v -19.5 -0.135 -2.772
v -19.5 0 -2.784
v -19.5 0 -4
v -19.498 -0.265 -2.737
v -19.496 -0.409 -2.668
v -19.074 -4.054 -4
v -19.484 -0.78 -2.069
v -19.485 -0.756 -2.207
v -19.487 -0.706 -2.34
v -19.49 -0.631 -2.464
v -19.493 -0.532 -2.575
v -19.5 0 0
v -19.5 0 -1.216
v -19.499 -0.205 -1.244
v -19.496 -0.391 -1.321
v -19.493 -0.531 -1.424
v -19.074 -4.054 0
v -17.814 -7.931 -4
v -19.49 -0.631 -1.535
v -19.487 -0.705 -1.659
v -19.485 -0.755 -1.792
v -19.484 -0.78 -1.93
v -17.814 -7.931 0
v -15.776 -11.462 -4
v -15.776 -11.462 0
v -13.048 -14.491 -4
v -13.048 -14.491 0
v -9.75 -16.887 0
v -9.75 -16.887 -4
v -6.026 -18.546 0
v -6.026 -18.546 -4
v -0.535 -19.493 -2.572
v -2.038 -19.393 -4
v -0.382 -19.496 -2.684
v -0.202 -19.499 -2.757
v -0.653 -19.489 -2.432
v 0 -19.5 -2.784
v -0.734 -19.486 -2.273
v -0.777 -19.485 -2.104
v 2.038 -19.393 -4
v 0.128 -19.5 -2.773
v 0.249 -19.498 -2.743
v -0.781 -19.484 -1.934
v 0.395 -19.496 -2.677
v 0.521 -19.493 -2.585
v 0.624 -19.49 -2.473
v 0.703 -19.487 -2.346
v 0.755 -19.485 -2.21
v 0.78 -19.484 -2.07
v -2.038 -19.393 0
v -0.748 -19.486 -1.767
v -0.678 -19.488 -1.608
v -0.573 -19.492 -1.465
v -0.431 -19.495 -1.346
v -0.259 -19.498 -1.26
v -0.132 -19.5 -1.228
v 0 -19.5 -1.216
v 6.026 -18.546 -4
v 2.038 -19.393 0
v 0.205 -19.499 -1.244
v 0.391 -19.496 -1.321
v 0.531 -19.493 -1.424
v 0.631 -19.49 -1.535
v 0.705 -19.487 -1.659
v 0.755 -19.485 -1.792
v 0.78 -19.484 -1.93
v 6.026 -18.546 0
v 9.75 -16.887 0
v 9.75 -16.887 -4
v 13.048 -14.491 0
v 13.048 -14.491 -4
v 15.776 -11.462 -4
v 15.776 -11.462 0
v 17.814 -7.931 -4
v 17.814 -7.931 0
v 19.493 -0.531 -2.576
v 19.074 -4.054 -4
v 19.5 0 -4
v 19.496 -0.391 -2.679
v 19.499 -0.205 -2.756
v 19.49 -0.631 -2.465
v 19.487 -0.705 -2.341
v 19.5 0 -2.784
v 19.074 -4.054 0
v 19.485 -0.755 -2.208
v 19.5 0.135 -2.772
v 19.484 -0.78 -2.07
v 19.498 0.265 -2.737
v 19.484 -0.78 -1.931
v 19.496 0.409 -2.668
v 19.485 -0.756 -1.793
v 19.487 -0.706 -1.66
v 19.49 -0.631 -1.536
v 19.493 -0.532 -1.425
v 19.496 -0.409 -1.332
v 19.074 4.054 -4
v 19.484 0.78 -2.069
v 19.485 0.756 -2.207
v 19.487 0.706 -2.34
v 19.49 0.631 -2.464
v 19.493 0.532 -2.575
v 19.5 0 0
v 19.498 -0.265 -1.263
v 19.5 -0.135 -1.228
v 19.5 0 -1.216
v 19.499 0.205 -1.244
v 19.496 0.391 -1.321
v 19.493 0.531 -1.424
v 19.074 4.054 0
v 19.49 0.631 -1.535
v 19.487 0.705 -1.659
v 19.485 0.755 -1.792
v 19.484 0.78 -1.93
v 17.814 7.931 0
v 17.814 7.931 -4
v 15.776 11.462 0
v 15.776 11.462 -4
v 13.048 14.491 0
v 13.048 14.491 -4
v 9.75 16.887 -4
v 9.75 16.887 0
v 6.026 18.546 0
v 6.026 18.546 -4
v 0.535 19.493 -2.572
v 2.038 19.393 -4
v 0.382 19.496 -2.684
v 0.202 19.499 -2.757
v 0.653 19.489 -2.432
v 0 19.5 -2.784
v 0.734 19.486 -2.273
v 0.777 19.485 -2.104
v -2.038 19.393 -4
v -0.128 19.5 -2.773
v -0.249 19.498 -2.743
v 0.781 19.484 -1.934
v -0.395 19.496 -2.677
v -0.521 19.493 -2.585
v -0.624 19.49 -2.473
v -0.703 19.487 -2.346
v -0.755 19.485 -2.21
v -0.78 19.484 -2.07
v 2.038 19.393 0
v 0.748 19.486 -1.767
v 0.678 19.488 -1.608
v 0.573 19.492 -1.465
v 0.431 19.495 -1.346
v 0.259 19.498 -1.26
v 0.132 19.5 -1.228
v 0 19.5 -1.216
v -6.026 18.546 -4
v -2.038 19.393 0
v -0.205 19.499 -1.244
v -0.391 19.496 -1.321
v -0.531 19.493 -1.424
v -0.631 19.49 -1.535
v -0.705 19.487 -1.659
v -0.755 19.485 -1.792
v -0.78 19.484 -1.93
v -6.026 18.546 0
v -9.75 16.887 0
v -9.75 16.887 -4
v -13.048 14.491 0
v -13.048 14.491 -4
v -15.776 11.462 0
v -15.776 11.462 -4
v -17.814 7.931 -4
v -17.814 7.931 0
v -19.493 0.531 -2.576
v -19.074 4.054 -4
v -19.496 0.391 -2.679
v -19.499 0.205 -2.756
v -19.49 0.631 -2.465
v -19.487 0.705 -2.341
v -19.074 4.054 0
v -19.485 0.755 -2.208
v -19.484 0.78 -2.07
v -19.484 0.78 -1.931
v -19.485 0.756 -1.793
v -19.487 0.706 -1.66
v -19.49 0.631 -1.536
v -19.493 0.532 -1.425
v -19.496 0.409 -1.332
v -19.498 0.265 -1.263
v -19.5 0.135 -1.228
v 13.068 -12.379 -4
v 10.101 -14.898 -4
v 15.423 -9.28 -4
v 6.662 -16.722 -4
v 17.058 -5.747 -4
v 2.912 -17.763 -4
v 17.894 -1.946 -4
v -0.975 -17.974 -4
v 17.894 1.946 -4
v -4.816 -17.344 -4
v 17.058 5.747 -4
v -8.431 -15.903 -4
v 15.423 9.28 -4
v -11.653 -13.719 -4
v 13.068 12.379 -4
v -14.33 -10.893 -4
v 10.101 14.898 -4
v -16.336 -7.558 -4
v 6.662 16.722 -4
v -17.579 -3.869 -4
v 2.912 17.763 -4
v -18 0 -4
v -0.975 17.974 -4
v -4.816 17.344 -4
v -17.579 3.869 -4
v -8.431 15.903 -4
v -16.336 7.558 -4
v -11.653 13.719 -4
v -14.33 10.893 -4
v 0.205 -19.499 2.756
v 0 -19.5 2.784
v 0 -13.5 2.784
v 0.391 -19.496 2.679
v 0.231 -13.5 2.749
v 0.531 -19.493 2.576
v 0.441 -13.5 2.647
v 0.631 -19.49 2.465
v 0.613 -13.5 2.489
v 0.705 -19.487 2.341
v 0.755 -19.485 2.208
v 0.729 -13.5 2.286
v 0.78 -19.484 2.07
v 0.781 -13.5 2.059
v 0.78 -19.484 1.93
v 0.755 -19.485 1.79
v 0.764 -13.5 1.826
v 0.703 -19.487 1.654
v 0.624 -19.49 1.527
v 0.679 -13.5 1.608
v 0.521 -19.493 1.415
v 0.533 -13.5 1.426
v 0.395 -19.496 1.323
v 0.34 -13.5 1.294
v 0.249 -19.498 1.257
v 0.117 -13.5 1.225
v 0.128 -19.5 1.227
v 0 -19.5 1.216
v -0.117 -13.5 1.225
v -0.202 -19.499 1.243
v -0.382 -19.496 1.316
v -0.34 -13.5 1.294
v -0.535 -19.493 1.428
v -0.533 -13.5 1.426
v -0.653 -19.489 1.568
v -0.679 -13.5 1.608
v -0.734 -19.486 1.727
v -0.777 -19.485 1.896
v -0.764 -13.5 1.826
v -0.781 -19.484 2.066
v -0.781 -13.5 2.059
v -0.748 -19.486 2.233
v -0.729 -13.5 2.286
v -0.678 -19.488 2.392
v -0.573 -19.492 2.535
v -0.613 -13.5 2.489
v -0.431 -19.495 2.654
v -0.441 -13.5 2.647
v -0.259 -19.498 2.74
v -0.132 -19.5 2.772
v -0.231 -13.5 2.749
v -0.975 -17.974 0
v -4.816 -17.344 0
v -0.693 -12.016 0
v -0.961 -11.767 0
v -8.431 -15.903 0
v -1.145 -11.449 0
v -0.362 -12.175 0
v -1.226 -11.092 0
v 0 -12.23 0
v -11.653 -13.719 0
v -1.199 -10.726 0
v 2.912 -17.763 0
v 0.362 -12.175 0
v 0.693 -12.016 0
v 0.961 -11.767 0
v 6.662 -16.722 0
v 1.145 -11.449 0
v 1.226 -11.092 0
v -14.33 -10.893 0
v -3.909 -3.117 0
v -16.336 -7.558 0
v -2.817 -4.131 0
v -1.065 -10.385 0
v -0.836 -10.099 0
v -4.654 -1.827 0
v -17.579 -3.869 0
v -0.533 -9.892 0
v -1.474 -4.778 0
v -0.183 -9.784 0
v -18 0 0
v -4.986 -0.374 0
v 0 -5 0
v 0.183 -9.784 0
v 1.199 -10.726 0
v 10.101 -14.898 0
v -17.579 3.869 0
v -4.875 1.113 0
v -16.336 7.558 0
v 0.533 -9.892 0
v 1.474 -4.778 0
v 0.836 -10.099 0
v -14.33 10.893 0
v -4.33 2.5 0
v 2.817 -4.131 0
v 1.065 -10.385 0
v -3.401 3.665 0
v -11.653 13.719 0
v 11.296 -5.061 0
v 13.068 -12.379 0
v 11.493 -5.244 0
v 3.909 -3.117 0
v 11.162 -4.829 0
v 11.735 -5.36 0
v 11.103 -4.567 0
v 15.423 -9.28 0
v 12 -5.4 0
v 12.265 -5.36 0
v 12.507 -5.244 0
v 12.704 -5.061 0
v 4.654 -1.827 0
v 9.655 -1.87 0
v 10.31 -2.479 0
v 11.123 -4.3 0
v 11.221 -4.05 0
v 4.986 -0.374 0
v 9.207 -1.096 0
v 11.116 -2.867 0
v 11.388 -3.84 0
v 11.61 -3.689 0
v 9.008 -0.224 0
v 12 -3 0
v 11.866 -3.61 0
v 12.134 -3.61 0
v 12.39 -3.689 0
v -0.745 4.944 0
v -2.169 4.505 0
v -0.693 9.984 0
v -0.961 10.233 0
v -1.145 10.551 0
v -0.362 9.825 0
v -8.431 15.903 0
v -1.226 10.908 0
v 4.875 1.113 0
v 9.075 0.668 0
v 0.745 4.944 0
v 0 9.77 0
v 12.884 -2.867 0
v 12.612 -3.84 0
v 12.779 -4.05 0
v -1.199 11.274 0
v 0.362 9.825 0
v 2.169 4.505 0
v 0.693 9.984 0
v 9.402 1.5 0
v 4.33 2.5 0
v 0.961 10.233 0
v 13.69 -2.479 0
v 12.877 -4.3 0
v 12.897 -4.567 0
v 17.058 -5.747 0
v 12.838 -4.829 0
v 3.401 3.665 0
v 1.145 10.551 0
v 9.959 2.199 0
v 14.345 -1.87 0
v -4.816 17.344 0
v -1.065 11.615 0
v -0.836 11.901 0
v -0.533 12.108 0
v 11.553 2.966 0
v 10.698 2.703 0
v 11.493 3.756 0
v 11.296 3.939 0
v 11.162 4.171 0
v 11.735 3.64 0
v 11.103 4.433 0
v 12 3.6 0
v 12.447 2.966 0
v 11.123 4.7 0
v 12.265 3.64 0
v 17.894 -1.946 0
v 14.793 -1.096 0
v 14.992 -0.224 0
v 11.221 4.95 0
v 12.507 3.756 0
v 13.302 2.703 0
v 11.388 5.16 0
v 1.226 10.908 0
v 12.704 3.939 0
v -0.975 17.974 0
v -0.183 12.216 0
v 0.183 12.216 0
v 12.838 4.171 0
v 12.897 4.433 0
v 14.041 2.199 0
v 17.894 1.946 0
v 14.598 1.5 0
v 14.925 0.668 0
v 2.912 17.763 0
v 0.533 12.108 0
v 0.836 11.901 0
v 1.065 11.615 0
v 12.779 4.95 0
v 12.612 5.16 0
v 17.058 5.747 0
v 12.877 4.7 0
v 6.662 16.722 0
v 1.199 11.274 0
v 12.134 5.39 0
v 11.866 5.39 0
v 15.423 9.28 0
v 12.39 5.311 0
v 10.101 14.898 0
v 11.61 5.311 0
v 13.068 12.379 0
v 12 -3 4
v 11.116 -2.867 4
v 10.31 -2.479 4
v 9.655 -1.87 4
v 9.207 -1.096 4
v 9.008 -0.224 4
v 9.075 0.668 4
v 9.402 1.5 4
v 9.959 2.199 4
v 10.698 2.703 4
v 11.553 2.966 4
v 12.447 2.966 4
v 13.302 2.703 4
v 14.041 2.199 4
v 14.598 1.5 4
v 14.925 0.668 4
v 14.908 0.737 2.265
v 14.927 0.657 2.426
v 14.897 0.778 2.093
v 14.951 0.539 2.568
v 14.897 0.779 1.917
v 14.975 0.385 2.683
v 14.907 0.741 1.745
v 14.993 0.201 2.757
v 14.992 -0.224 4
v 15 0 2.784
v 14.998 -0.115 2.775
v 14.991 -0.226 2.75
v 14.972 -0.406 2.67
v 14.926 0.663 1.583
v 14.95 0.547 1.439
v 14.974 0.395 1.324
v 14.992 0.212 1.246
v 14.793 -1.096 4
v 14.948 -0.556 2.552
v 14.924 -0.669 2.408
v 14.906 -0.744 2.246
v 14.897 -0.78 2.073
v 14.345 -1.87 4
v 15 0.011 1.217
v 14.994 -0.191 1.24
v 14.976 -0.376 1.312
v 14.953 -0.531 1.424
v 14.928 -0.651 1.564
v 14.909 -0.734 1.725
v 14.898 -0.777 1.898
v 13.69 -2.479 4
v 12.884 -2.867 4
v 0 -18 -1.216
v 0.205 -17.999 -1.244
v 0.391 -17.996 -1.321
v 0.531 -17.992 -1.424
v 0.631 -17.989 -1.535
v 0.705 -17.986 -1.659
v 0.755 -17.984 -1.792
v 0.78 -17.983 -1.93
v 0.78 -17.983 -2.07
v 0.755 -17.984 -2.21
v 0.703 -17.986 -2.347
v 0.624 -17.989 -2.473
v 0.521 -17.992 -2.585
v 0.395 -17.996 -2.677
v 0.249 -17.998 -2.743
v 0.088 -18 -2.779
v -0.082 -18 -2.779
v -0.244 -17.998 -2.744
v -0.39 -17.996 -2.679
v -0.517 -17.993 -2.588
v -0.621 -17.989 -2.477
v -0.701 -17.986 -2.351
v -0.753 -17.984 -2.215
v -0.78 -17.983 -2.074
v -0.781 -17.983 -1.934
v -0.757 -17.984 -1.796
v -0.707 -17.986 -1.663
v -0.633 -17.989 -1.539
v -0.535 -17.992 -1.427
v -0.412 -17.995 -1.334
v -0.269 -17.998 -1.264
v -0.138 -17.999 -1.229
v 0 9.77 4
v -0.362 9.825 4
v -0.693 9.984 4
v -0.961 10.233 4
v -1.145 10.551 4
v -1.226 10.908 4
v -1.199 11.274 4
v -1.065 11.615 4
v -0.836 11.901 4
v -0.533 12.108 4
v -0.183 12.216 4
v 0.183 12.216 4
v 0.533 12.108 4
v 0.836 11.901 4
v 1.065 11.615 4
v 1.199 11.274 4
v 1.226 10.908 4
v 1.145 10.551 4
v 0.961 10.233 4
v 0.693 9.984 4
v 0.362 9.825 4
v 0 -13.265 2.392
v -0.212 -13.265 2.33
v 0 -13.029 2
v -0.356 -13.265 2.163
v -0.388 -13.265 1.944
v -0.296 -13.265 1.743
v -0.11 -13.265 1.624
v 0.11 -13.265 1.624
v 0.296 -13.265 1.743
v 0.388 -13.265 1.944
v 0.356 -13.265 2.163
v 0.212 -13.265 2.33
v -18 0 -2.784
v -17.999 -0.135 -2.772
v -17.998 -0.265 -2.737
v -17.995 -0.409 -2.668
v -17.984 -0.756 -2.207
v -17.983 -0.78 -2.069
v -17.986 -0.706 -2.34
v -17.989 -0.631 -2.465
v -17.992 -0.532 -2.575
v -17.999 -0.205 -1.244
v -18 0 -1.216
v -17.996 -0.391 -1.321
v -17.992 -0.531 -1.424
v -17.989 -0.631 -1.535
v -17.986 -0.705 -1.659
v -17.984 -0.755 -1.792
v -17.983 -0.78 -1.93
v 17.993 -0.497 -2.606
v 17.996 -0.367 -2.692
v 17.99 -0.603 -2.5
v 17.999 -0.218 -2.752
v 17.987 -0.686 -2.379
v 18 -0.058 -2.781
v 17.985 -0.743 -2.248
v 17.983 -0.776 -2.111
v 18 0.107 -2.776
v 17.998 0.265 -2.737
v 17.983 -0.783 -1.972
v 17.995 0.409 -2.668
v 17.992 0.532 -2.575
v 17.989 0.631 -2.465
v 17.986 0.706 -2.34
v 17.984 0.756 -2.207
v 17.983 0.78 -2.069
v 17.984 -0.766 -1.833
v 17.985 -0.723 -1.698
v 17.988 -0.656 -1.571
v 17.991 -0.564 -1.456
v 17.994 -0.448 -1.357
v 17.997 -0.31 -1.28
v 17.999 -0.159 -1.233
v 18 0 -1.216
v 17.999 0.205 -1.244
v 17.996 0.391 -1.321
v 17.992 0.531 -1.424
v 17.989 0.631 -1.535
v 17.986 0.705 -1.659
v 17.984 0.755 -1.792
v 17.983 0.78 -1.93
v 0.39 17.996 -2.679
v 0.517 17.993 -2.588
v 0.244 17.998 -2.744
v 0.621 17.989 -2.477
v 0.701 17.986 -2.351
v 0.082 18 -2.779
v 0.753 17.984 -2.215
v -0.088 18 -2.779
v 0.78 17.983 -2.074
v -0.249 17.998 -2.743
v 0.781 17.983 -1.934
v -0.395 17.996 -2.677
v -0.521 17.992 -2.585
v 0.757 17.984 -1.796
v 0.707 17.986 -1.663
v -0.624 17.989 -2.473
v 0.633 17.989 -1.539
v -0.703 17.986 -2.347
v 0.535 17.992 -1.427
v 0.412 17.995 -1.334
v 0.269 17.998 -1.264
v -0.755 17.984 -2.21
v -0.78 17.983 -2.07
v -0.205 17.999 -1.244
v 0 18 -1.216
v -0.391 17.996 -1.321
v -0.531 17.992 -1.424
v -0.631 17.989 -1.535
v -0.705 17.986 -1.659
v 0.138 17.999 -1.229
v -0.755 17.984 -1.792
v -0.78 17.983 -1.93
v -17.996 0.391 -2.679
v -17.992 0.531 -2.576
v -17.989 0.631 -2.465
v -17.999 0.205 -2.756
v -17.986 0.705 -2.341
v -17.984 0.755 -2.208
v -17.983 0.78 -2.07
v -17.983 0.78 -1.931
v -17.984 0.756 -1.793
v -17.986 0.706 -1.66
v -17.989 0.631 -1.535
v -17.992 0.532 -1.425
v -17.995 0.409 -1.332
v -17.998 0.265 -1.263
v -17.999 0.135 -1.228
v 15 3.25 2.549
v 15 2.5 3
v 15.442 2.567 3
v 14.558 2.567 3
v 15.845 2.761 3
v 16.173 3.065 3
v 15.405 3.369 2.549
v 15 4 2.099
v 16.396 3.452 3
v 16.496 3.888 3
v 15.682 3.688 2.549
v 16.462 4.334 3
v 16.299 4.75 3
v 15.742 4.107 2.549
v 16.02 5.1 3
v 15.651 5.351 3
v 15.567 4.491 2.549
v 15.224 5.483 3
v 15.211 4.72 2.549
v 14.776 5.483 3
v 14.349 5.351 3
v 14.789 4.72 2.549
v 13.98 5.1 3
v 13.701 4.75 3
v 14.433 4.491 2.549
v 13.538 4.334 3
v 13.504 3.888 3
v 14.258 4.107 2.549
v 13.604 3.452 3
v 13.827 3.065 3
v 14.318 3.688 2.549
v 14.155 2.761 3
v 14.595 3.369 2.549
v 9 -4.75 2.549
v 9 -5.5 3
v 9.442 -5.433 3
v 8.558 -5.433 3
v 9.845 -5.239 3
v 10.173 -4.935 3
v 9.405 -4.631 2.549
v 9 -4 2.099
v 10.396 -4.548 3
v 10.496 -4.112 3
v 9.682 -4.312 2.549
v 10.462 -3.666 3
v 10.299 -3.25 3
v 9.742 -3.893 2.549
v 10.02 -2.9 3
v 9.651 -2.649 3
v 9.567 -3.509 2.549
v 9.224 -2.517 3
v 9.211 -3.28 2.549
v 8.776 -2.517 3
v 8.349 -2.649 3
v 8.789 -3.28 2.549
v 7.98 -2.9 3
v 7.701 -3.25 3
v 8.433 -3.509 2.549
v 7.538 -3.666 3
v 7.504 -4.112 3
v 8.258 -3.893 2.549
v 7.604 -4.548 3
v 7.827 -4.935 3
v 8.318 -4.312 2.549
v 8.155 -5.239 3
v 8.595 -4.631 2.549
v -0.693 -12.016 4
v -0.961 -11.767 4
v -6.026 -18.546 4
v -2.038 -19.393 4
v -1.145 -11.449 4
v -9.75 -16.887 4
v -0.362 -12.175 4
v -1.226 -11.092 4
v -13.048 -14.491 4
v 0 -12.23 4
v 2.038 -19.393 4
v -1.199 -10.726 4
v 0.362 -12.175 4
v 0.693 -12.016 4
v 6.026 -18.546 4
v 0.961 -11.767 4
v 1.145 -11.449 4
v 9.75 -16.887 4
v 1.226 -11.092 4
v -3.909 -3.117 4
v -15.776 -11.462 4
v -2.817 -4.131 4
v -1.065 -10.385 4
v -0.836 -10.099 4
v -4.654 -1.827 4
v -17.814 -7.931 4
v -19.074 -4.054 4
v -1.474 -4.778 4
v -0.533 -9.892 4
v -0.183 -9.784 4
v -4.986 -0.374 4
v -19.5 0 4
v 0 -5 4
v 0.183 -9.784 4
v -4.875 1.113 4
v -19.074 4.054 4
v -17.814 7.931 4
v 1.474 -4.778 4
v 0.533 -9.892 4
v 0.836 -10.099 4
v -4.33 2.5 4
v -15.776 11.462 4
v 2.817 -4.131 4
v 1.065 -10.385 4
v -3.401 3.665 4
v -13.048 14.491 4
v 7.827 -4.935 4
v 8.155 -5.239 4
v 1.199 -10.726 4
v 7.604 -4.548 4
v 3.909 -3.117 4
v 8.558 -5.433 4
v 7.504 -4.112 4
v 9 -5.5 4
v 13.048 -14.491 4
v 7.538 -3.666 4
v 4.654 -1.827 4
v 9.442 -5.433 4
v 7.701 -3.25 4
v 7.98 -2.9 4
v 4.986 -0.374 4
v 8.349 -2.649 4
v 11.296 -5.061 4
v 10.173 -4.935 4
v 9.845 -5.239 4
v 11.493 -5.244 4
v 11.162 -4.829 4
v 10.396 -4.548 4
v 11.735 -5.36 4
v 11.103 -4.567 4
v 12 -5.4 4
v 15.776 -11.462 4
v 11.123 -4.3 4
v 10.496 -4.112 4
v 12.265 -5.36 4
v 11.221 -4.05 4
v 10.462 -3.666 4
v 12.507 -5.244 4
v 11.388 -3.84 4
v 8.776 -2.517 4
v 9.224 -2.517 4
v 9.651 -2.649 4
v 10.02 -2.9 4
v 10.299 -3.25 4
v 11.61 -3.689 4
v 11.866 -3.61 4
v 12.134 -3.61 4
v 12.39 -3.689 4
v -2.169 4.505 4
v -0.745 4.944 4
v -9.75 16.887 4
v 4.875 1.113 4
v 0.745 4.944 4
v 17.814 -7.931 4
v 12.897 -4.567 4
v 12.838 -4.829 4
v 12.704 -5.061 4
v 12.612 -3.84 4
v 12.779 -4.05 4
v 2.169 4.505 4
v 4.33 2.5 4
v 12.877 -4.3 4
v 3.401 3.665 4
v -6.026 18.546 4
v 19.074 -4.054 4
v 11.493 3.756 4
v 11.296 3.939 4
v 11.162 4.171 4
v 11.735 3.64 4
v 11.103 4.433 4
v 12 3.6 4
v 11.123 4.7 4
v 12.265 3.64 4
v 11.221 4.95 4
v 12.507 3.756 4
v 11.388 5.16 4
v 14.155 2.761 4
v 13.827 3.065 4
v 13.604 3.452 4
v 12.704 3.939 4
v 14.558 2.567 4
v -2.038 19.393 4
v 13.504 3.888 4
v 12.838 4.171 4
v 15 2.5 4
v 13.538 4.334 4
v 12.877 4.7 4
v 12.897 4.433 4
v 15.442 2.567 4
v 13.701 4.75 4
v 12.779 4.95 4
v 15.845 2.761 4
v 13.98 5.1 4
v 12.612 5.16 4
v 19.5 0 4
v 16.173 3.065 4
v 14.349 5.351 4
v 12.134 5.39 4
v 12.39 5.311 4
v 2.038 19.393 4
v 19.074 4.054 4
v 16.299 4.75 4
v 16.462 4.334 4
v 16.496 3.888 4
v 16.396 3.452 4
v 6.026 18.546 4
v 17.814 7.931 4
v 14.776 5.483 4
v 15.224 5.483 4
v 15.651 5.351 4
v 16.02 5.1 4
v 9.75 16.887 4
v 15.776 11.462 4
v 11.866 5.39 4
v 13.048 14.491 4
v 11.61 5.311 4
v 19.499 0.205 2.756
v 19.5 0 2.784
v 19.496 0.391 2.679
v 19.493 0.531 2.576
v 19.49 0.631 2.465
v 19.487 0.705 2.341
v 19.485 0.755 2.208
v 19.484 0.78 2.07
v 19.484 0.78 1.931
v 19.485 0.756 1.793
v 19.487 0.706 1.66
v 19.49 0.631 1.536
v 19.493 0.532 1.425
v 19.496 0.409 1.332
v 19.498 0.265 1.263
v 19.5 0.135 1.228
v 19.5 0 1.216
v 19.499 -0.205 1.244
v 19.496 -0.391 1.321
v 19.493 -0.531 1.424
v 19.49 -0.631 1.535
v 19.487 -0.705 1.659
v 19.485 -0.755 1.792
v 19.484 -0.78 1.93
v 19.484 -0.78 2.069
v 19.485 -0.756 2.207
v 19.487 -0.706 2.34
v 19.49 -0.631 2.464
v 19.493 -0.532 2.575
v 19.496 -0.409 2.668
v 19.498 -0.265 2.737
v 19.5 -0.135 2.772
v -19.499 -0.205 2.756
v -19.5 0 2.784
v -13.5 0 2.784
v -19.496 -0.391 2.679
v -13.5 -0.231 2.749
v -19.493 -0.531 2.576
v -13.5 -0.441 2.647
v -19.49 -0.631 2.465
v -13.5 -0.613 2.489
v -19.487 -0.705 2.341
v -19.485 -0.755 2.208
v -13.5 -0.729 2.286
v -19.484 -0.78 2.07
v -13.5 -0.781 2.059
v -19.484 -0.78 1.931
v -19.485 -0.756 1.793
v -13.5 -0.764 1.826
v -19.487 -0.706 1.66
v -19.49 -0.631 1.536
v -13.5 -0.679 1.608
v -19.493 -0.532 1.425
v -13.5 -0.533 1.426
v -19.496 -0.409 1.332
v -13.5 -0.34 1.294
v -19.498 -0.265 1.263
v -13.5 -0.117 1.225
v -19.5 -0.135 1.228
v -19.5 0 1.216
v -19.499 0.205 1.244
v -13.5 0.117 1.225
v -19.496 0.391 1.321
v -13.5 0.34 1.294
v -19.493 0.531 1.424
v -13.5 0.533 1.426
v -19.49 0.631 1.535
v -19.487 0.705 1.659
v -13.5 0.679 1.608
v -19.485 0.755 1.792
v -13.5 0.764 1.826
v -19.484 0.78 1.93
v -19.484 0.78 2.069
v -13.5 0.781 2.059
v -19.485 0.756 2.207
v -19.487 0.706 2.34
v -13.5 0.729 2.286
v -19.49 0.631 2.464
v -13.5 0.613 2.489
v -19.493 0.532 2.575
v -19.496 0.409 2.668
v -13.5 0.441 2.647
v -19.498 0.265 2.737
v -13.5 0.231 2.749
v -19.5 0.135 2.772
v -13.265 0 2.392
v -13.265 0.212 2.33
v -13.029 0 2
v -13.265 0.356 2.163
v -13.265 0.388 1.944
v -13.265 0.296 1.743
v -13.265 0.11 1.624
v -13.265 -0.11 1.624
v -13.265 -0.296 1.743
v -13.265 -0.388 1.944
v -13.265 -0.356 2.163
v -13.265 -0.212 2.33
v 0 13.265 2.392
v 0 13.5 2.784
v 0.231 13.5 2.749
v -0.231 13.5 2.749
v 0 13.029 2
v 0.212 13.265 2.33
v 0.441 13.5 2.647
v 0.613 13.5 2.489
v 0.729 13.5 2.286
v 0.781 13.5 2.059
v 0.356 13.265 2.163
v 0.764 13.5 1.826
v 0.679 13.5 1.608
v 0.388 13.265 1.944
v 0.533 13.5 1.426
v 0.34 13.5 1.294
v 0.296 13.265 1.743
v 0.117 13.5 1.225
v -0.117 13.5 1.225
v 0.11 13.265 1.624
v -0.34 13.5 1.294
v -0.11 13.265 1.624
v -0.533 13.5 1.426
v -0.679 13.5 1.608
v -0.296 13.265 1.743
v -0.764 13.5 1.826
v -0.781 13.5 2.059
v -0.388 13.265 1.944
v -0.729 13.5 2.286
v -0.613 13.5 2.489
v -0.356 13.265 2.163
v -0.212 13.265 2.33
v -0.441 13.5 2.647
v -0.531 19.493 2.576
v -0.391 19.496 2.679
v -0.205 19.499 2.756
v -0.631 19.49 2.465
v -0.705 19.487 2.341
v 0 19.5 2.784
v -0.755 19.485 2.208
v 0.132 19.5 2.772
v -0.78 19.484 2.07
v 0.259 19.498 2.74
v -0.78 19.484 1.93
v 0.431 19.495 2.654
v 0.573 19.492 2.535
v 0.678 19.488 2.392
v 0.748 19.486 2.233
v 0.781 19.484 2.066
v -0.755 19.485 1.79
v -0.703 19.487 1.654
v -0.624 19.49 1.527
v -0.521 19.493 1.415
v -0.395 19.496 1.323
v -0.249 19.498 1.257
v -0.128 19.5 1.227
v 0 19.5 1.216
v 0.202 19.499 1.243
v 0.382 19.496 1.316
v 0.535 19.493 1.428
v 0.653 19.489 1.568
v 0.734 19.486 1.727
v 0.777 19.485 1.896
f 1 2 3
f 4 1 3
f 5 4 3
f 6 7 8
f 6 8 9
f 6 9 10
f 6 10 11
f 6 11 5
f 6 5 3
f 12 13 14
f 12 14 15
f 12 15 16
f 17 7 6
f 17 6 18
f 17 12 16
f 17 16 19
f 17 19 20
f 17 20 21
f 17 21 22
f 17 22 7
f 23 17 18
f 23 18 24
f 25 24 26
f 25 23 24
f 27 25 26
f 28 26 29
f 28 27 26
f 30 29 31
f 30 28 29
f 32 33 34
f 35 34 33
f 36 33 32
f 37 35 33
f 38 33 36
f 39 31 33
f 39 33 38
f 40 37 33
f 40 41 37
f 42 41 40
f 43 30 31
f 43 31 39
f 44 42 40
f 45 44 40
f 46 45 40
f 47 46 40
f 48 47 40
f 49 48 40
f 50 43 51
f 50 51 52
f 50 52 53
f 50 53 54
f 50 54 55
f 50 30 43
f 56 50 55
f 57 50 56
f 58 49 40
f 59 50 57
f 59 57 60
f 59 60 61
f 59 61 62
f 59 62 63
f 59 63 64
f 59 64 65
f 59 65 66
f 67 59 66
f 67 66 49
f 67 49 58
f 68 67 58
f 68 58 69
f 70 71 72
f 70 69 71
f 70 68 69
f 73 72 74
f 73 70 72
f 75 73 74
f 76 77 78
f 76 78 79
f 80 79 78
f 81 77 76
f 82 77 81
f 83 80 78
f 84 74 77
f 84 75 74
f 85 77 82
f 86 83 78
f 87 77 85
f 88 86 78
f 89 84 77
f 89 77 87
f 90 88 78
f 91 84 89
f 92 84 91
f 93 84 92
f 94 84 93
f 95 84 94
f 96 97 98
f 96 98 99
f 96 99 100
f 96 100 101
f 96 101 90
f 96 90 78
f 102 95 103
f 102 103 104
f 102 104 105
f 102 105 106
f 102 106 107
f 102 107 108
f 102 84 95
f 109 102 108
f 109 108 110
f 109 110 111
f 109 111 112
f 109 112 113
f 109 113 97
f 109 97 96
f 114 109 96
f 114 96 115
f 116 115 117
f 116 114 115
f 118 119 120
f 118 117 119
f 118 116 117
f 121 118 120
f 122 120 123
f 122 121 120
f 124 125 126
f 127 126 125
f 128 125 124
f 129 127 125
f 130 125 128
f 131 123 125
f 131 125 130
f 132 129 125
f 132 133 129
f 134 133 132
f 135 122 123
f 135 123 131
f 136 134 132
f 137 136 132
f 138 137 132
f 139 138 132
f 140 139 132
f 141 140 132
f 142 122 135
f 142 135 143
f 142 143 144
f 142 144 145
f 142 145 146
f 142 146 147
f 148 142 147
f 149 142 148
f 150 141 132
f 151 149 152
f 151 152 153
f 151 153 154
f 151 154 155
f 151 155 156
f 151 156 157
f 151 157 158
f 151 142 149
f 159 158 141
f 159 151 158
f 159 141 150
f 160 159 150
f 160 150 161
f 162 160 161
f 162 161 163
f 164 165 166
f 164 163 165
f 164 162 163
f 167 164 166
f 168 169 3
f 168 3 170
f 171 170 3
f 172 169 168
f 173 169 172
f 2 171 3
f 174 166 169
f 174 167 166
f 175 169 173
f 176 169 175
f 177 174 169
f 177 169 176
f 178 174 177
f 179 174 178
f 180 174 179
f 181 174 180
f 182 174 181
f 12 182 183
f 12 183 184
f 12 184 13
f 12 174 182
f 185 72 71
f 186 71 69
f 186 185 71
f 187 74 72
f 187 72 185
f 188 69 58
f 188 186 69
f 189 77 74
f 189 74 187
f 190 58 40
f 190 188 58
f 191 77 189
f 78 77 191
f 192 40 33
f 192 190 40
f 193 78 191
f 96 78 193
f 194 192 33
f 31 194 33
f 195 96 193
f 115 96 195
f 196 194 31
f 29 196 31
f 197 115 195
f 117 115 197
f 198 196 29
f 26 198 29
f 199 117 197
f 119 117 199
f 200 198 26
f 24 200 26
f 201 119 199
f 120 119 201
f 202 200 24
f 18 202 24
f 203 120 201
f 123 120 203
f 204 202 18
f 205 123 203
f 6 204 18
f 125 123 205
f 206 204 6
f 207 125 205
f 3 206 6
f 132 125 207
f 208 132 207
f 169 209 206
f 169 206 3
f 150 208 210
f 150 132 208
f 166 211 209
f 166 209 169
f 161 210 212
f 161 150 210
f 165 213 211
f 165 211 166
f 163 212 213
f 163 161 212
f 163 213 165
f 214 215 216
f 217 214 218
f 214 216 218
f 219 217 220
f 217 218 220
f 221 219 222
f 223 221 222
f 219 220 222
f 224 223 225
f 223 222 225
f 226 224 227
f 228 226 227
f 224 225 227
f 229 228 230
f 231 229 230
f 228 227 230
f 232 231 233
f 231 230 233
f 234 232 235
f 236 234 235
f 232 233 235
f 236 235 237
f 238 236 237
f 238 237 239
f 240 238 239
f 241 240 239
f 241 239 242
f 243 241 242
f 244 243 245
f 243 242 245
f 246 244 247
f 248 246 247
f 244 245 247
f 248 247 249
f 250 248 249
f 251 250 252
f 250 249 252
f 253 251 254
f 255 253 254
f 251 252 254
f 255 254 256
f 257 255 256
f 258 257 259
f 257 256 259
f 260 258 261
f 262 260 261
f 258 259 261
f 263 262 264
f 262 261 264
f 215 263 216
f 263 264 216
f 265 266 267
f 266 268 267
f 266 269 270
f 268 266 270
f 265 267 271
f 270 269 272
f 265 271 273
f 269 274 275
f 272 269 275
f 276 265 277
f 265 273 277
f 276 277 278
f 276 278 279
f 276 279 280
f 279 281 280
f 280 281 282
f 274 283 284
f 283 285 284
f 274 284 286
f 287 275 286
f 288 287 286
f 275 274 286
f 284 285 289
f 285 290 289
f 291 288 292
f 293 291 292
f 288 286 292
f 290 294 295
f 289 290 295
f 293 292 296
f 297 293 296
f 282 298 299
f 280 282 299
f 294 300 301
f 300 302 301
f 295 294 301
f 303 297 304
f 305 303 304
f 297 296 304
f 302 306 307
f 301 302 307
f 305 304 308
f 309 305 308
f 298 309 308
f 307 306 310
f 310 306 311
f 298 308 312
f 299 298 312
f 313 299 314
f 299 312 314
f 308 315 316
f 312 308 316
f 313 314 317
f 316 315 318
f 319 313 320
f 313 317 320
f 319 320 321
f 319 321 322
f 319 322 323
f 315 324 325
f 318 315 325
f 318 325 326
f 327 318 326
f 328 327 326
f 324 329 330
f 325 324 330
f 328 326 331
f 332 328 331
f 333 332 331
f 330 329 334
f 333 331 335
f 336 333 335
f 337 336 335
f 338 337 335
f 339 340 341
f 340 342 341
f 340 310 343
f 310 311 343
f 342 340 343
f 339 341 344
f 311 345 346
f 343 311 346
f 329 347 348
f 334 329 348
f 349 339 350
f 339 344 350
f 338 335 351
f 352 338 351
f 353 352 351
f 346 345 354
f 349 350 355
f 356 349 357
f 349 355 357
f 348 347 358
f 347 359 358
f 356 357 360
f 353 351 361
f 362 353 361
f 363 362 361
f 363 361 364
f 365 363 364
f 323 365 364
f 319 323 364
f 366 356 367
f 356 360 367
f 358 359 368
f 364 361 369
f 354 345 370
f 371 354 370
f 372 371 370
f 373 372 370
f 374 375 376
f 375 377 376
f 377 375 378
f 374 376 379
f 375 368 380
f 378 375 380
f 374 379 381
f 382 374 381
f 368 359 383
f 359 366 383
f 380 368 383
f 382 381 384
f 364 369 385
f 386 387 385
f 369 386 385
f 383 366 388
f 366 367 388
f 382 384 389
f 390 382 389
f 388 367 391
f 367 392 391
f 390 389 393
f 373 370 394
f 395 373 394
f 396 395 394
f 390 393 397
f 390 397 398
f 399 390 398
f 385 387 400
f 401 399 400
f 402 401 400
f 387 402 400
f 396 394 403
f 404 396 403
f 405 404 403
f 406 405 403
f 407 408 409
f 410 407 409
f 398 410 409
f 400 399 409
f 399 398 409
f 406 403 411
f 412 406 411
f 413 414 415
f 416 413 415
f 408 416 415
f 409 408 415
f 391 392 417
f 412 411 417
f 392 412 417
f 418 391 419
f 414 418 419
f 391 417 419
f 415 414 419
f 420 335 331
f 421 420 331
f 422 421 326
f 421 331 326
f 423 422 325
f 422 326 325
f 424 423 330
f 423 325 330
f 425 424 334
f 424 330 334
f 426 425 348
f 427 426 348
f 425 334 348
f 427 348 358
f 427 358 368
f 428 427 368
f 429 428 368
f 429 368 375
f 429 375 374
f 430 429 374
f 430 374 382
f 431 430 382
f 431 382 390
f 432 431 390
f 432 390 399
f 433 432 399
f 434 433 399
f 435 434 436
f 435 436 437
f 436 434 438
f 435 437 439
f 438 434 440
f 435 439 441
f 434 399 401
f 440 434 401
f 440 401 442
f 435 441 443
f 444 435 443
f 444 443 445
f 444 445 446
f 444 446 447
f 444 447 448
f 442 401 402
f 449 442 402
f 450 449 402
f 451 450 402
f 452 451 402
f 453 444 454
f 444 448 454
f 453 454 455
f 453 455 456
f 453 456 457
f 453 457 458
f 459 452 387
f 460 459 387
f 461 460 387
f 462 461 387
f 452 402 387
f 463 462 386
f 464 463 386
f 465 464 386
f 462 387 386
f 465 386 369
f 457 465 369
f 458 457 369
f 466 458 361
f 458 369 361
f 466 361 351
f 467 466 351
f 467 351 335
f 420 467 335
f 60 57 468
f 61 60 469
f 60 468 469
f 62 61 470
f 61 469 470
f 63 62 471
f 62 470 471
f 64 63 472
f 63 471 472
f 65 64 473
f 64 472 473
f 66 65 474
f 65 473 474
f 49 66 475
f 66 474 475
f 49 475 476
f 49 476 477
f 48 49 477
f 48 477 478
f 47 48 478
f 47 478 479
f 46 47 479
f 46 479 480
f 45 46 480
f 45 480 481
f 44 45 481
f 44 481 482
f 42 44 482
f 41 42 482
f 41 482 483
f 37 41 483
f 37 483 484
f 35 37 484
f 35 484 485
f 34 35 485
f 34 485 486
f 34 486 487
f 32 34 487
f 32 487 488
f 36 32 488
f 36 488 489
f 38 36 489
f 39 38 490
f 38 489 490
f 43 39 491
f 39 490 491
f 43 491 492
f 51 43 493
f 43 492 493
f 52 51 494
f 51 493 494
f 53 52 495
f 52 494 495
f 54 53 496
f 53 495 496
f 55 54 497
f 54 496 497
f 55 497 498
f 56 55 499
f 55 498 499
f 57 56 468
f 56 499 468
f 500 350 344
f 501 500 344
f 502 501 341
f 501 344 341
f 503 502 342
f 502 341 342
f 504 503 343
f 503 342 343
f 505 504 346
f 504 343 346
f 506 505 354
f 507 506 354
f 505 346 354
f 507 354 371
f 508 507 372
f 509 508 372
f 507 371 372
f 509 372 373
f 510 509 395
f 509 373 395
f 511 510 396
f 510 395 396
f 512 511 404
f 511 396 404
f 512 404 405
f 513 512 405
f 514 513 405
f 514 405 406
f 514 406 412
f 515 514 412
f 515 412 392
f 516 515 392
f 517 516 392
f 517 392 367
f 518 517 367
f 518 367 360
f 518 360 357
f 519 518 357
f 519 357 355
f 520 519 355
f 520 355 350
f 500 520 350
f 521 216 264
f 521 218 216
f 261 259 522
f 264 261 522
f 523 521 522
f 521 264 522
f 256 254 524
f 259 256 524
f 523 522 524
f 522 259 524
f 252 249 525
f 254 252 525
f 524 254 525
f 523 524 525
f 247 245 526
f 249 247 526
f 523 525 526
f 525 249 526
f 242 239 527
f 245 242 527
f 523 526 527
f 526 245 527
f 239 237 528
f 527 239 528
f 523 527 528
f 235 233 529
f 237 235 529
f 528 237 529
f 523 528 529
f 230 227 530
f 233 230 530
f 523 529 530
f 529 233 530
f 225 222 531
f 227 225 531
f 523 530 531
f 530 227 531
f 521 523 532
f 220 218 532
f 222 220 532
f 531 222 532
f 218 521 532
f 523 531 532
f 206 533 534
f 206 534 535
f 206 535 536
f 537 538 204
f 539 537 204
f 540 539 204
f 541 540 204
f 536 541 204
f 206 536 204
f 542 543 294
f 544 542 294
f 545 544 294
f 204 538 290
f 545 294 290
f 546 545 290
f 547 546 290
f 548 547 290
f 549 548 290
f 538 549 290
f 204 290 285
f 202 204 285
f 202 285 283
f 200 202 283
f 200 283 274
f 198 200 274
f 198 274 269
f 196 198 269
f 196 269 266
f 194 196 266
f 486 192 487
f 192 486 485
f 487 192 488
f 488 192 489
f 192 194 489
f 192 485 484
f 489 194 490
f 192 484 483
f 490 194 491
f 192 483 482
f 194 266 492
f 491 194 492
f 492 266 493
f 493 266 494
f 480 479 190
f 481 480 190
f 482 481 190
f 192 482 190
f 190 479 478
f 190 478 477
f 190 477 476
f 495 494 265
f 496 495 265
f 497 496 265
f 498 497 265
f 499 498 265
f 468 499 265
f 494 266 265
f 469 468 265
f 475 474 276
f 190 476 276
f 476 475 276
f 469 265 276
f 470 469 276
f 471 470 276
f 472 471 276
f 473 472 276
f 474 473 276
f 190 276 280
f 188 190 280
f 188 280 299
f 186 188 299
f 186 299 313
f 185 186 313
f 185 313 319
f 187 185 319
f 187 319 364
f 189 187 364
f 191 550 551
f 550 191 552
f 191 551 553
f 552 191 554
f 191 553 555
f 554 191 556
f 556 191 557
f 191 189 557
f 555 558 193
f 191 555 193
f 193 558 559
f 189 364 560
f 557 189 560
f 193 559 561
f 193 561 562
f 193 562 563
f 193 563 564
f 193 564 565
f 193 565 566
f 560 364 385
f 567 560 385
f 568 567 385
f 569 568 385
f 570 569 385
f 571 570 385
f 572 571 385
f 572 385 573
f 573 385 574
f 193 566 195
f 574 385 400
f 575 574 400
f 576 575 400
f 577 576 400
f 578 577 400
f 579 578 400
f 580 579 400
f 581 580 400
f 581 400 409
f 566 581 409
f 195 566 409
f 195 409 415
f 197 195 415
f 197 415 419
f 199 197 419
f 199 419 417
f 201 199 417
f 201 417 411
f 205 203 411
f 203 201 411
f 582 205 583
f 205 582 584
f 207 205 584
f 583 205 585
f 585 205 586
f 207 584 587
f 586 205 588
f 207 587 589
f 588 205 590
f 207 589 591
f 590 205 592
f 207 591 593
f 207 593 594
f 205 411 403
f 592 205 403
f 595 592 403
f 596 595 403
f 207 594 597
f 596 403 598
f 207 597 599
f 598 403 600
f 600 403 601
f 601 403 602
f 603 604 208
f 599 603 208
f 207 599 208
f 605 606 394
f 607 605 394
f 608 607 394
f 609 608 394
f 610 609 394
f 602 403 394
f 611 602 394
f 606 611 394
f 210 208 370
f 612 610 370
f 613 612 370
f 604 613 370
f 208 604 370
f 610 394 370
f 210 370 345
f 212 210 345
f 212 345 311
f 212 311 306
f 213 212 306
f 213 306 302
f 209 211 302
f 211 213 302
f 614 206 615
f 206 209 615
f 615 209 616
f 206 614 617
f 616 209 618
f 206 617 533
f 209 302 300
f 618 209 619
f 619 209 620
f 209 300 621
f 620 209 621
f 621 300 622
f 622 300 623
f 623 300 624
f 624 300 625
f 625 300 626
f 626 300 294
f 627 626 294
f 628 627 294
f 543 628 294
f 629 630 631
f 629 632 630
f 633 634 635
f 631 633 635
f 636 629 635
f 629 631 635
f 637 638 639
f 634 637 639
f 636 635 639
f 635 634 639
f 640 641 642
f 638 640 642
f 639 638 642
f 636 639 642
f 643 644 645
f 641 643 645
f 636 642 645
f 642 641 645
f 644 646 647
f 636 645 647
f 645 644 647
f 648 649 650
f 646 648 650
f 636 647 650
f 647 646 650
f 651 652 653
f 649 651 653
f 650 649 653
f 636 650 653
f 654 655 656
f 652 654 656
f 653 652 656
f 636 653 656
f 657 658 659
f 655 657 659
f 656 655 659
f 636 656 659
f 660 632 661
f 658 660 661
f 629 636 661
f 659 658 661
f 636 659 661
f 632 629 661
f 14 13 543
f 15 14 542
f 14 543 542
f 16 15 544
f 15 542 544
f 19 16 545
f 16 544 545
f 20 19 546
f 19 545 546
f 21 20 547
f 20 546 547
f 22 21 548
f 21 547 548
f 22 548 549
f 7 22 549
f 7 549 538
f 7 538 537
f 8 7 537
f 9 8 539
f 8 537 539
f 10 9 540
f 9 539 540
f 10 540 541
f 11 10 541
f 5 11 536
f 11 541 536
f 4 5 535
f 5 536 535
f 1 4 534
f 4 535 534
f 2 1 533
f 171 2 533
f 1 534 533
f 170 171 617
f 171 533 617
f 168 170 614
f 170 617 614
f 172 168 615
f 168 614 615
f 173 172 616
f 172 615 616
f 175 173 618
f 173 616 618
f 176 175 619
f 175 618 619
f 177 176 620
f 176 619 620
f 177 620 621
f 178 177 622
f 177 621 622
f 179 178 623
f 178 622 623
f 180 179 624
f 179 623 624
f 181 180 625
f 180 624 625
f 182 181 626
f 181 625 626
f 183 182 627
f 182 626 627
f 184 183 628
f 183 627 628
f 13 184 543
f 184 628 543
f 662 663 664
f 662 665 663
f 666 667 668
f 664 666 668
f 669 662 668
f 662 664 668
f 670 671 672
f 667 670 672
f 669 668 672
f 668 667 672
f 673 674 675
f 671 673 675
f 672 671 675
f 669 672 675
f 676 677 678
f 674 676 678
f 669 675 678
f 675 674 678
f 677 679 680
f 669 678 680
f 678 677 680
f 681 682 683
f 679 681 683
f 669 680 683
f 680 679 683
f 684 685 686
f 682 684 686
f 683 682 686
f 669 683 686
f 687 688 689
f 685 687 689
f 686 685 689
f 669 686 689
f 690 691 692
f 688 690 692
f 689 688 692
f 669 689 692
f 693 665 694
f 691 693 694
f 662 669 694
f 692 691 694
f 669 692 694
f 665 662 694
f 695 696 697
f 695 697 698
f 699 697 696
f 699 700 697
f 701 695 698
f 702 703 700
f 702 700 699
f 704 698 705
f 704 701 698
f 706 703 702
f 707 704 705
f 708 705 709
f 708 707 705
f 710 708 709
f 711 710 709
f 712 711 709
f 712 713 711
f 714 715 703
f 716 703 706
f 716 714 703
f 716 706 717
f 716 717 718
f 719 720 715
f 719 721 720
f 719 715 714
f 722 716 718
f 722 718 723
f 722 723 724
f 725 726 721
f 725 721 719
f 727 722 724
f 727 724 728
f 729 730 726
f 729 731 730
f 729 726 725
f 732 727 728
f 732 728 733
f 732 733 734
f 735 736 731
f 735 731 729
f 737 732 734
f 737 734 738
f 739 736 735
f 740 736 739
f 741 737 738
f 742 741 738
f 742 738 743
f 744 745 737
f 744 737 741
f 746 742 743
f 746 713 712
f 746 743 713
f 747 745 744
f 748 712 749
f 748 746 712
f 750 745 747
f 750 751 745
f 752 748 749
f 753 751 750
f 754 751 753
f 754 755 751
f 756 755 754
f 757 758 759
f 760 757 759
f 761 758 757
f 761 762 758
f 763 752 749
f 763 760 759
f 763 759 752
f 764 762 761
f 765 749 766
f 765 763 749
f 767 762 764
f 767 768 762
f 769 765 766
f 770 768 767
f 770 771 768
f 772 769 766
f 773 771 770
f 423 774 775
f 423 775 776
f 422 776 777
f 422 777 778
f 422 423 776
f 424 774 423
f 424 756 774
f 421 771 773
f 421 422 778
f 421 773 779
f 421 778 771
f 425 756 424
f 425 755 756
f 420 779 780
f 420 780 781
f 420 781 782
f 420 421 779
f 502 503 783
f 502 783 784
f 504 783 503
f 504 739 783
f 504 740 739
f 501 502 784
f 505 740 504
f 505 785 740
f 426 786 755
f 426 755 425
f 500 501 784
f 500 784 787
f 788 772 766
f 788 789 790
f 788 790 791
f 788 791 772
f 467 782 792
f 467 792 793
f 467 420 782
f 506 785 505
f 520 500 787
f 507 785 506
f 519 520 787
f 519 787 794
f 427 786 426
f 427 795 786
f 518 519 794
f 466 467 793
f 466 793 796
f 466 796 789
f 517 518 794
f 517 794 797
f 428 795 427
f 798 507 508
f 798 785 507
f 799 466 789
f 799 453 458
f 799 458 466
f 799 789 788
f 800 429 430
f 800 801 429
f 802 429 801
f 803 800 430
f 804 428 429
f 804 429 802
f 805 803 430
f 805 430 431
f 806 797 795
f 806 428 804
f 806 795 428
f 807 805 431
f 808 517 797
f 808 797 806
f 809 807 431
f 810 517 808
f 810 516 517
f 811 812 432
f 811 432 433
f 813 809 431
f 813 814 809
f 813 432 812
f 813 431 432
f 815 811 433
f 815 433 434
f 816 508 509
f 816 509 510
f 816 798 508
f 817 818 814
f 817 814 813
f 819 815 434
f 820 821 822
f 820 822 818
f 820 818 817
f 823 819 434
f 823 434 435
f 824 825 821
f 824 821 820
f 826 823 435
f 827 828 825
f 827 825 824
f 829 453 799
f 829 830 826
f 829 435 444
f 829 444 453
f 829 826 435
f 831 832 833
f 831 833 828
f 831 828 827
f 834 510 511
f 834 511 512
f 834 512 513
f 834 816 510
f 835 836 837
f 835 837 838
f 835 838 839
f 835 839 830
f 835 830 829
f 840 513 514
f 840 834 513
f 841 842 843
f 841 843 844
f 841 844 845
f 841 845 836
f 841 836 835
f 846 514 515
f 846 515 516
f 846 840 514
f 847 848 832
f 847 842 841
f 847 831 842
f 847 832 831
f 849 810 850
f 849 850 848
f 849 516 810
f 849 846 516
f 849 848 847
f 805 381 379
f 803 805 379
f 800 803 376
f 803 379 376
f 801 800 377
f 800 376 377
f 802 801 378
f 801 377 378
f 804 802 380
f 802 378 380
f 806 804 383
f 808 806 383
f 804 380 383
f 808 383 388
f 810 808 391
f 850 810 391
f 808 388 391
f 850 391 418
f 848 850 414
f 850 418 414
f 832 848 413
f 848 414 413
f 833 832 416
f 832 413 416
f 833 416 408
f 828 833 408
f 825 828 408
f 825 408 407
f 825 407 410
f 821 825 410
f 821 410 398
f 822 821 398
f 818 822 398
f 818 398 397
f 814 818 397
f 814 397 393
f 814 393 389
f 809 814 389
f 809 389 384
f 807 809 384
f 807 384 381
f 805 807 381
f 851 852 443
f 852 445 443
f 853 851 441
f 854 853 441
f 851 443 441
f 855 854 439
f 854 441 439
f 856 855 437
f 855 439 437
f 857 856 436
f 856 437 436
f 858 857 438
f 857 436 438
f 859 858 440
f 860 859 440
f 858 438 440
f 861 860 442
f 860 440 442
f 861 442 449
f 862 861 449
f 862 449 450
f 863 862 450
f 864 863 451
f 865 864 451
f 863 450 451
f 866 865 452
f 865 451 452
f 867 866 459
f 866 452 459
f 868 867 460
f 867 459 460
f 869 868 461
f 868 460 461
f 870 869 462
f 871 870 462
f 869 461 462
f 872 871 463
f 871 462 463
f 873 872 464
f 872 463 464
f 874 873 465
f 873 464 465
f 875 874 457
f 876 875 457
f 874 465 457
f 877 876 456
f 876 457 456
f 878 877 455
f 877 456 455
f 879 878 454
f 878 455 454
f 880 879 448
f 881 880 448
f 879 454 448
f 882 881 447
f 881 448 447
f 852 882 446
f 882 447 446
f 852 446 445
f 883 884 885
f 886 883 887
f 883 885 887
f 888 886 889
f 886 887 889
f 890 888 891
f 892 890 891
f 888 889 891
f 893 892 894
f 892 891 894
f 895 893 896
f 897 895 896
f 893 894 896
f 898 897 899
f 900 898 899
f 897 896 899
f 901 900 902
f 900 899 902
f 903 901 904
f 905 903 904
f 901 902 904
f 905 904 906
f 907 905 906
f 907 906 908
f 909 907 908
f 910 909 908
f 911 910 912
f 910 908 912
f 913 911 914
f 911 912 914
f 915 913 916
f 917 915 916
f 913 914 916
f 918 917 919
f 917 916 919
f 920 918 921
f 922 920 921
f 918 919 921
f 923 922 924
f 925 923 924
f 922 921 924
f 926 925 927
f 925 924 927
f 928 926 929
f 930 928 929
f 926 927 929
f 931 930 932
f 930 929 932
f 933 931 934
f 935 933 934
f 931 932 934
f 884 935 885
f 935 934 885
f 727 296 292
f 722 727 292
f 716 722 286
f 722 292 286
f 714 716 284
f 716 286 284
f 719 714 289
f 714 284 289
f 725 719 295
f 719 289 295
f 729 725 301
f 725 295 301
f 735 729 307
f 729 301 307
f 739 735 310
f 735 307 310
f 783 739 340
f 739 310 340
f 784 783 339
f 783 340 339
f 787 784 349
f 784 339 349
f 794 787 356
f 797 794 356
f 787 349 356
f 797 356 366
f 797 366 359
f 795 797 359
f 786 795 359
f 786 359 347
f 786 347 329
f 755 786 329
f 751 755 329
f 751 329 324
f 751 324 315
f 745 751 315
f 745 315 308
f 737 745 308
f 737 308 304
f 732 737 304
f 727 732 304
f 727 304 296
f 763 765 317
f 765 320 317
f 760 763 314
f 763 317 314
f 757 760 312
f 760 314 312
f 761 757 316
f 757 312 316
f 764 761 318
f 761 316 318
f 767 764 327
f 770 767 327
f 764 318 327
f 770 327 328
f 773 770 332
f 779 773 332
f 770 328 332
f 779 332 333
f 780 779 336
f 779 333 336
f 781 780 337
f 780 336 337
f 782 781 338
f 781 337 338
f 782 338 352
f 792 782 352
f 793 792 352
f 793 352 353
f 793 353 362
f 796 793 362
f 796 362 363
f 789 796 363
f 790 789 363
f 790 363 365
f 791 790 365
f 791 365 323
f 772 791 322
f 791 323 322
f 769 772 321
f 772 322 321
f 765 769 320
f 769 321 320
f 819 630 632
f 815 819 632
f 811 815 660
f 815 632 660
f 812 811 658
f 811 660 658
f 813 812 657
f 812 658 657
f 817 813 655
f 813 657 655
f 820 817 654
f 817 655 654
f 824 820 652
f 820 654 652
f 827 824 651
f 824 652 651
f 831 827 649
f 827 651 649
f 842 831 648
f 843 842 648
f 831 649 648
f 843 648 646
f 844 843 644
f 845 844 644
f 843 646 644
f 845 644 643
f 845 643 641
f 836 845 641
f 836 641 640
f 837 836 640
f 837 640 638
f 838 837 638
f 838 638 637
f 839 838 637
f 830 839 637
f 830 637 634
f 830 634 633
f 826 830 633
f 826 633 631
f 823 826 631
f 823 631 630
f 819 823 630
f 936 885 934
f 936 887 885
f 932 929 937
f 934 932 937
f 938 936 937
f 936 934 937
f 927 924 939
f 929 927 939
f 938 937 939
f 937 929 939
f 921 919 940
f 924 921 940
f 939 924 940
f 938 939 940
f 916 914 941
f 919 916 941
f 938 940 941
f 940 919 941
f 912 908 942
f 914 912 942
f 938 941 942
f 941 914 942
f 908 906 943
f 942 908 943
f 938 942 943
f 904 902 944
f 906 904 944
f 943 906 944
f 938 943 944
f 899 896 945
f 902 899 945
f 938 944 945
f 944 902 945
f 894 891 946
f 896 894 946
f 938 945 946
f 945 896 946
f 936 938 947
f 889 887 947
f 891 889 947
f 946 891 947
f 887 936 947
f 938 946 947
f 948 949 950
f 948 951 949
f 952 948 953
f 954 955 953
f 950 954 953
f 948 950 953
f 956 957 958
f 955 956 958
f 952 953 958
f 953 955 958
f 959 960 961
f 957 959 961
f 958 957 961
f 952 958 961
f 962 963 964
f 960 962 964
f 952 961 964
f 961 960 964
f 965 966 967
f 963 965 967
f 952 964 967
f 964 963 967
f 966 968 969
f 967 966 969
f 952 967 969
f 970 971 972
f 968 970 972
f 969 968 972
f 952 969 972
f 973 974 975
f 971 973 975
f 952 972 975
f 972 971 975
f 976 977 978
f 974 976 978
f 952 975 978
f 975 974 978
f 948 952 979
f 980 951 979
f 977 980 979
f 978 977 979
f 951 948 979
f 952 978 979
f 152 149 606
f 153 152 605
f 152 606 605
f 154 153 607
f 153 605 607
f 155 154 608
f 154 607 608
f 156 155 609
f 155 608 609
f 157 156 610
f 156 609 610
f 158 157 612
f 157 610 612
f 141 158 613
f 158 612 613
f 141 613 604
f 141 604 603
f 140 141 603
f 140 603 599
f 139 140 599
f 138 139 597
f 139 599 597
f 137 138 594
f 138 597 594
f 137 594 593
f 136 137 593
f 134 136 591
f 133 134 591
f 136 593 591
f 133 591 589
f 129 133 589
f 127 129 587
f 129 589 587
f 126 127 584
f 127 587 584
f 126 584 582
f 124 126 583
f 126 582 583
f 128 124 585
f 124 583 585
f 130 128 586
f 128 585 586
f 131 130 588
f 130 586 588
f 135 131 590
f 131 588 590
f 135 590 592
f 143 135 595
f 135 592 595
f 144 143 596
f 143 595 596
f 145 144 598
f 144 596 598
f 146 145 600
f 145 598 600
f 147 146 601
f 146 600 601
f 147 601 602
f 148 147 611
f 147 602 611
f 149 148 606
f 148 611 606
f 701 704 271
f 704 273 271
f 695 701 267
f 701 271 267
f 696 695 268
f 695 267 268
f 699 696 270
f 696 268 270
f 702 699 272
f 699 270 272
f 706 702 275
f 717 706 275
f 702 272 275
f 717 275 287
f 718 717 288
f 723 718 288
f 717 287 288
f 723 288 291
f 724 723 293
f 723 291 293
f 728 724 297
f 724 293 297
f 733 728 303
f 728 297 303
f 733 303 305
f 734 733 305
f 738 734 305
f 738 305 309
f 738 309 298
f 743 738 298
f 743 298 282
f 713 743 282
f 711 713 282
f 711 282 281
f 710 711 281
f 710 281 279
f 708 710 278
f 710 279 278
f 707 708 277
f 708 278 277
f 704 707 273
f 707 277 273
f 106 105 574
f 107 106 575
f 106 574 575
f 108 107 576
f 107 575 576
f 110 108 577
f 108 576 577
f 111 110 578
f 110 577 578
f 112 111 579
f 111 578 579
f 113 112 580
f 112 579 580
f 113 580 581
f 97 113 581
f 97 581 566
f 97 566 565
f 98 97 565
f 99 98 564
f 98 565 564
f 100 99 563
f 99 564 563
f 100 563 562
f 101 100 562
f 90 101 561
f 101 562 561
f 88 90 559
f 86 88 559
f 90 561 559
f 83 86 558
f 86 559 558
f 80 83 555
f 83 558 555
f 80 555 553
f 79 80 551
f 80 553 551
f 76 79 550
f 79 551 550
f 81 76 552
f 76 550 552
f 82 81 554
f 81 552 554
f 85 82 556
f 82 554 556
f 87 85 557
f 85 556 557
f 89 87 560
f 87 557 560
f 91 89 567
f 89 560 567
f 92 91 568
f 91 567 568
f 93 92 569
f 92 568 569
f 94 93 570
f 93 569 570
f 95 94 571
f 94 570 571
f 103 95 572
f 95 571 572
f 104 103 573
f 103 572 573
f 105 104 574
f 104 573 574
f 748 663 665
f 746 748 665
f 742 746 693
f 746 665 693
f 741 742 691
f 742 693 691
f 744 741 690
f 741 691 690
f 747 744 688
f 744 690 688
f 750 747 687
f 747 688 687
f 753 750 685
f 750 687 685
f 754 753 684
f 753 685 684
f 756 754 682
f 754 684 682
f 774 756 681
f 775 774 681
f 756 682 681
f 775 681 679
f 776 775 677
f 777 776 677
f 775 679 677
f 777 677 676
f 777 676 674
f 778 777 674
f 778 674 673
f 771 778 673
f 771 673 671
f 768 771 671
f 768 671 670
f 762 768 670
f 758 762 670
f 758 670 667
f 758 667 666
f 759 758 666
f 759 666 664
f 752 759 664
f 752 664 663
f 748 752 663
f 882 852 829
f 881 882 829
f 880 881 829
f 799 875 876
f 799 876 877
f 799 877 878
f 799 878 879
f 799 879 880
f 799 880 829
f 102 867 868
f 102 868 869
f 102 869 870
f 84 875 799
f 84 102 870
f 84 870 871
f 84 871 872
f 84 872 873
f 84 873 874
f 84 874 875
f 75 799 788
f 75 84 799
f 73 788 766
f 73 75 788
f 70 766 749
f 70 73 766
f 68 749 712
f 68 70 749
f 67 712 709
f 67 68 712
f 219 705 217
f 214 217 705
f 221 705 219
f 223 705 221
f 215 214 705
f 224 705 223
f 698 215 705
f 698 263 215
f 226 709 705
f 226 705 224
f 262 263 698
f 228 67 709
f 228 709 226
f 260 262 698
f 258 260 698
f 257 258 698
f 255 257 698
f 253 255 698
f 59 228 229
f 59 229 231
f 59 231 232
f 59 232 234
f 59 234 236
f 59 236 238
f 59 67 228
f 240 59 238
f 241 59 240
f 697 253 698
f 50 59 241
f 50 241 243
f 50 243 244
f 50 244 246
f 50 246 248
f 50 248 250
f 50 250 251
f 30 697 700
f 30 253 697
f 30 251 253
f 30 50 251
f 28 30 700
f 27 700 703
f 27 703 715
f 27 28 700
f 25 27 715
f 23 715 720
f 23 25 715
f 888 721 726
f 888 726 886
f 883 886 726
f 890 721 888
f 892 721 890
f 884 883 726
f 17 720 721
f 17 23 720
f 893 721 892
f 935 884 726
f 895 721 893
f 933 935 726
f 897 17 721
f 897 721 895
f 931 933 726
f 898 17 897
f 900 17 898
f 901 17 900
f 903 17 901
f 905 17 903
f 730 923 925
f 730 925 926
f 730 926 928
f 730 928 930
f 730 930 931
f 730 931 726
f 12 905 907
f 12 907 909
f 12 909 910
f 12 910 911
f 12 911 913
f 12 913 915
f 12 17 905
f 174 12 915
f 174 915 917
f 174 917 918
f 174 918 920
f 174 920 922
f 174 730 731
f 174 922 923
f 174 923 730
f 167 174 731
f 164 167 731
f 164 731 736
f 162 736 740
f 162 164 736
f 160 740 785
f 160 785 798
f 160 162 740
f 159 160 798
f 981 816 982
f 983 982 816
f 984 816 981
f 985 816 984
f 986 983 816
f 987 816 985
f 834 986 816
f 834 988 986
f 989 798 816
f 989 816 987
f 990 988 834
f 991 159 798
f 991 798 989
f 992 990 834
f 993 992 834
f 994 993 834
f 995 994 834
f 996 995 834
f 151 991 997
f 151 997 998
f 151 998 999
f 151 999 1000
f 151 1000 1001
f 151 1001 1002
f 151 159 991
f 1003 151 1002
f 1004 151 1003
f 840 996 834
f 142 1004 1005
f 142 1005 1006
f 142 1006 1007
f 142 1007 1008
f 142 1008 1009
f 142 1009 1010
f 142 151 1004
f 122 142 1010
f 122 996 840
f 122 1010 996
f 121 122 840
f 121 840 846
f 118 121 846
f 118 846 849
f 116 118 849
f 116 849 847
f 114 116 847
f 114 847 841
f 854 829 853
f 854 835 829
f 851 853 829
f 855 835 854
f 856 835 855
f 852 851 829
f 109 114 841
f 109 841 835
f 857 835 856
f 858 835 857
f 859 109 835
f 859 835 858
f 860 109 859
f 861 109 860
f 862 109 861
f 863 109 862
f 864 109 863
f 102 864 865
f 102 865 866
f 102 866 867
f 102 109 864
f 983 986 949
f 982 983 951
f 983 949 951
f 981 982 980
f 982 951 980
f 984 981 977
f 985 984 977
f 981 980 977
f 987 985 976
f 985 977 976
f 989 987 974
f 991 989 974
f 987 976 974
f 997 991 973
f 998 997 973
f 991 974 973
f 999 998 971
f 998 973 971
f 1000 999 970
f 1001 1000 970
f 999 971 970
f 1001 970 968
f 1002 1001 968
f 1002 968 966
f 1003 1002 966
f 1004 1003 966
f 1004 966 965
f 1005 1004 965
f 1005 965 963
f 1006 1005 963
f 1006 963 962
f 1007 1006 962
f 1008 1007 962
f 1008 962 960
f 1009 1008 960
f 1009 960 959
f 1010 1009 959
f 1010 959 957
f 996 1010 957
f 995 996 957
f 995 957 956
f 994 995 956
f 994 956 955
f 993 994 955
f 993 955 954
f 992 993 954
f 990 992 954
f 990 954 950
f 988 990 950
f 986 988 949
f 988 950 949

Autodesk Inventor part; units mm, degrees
ref_plane "XZ Plane" through (0, 0, 0) normal (0, 1, 0) x (-1, 0, 0)
sketch "Skizze1" plane through (0, 0, 0) normal (0, 0, 1) x (1, 0, 0)
  line L0 (-44.1689, 0) -> (40.5177, 0) projected
  line L1 (0, -38.9628) -> (0, 40.9677) projected
  circle A0 centre (0, 0) radius 19.5
  dimension "d0" = 39
extrude "Extrusion1" add sketch "Skizze1" along normal blind 4
hole "Bohrung1" at (0, 0, 4) direction (0, 0, -1) diameter 10 end through all
sketch "Skizze2" plane through (0, 0, 4) normal (0, 0, 1) x (1, 0, 0)
  circle A0 centre (0, 0) radius 5 projected
  line L0 (-44.1689, 0) -> (40.5177, 0) projected
  line L1 (0, -38.9628) -> (0, 40.9677) projected
  point P0 (12, 0)
  dimension "d14" = 12
hole "Bohrung2" at (12, 0, 4) direction (0, 0, -1) diameter 6 end through all
sketch "Skizze5" plane through (0, 0, 4) normal (0, 0, 1) x (1, 0, 0)
  circle A0 centre (9, -4) radius 0.7 projected
  circle A1 centre (15, 4) radius 0.7 projected
hole "Bohrung4" at (9, -4, 4) at (15, 4, 4) direction (0, 0, -1) diameter 3 depth 1 tip angle 118
sketch "Skizze7" plane through (0, 0, 4) normal (0, 0, 1) x (1, 0, 0)
  line L0 (0, -38.9628) -> (0, 40.9677) projected
  line L1 (-44.1689, 0) -> (40.5177, 0) projected
  point P0 (12, -4.5)
  point P1 (12, 4.5)
  dimension "d39" = 12
  dimension "d40" = 9
hole "Bohrung5" at (12, -4.5, 4) at (12, 4.5, 4) direction (0, 0, -1) diameter 1.8 end through all
sketch "Skizze9" plane through (0, 0, 0) normal (0, 0, -1) x (-1, 0, 0)
  circle A0 centre (0, 0) radius 19.5 projected
  circle A1 centre (0, 0) radius 18
  dimension "d58" = 1.5
extrude "Extrusion3" add sketch "Skizze9" along normal blind 4
ref_plane "Arbeitsebene1" through (-19.5, 0, 0) normal (1, 0, 0) x (0, 1, 0)
sketch "Skizze10" plane through (-19.5, 0, 0) normal (1, 0, 0) x (0, 1, 0)
  line L0 (-5.4, 4) -> (-3.6, 4) projected
  line L1 (3.6, 4) -> (5.4, 4) projected
  line L2 (-19.5, 4) -> (19.5, 4) projected
  line L3 (-3, 4) -> (3, 4) projected
  line L4 (-5, 4) -> (5, 4) projected
  line L5 (19.5, 4) -> (-19.5, 4) projected
  line L6 (-34.9563, 0) -> (28.576, 0) projected
  line L7 (0, -5.6) -> (0, 5.6) projected
  point P0 (0, 0)
  point P1 (-5.5, 4)
  point P2 (-2.5, 4)
  point P3 (2.5, 4)
  point P4 (5.5, 4)
  point P5 (0, 2)
  point P6 (0, -2)
  dimension "d63" = 2
  dimension "d104" = 4
hole "Bohrung7" at (-19.5, 0, 2) at (-19.5, 0, -2) direction (1, 0, 0) diameter 1.567 depth 6 tip angle 118 thread size "M2x0.4" class "6H" standard "ISO Metric profile"
sketch "Skizze11" plane through (0, 0, 4) normal (0, 0, 1) x (1, 0, 0)
  circle A0 centre (12, -4.5) radius 0.9 projected
  circle A1 centre (12, 4.5) radius 0.9 projected
  circle A2 centre (9, -4) radius 1.5 projected
  circle A3 centre (15, 4) radius 1.5 projected
  circle A4 centre (12, 0) radius 3 projected
  circle A5 centre (0, 0) radius 5 projected
  circle A6 centre (0, 0) radius 19.5 projected
  line L0 (0, 0) -> (-19.0596, 19.0596)
  line L1 (-27.3, 0) -> (27.3, 0) projected
  line L2 (0, -35.3992) -> (0, 31.2338) projected
  dimension "d71" = 45
ref_plane "Arbeitsebene4" through (13.7886, 13.7886, 0) normal (0.7071, 0.7071, 0) x (-0.7071, 0.7071, 0)
pattern_circular "Runde Anordnung1" count 4 over 360 about axis through (0, 0, 0) along (0, 0, 1) of "Bohrung7"
sketch "Skizze14" plane through (0, 0, 4) normal (0, 0, 1) x (1, 0, 0)
  line L0 (-27.3, 0) -> (27.3, 0) projected
  line L1 (0, -35.3992) -> (0, 31.2338) projected
  point P0 (0, 11)
  point P1 (0, -11)
  dimension "d96" = 22
hole "Bohrung10" at (0, 11, 4) at (0, -11, 4) direction (0, 0, -1) diameter 2.459 end through all thread size "M3x0.5" class "6H" standard "ISO Metric profile"
properties part number "13_1087_030"
